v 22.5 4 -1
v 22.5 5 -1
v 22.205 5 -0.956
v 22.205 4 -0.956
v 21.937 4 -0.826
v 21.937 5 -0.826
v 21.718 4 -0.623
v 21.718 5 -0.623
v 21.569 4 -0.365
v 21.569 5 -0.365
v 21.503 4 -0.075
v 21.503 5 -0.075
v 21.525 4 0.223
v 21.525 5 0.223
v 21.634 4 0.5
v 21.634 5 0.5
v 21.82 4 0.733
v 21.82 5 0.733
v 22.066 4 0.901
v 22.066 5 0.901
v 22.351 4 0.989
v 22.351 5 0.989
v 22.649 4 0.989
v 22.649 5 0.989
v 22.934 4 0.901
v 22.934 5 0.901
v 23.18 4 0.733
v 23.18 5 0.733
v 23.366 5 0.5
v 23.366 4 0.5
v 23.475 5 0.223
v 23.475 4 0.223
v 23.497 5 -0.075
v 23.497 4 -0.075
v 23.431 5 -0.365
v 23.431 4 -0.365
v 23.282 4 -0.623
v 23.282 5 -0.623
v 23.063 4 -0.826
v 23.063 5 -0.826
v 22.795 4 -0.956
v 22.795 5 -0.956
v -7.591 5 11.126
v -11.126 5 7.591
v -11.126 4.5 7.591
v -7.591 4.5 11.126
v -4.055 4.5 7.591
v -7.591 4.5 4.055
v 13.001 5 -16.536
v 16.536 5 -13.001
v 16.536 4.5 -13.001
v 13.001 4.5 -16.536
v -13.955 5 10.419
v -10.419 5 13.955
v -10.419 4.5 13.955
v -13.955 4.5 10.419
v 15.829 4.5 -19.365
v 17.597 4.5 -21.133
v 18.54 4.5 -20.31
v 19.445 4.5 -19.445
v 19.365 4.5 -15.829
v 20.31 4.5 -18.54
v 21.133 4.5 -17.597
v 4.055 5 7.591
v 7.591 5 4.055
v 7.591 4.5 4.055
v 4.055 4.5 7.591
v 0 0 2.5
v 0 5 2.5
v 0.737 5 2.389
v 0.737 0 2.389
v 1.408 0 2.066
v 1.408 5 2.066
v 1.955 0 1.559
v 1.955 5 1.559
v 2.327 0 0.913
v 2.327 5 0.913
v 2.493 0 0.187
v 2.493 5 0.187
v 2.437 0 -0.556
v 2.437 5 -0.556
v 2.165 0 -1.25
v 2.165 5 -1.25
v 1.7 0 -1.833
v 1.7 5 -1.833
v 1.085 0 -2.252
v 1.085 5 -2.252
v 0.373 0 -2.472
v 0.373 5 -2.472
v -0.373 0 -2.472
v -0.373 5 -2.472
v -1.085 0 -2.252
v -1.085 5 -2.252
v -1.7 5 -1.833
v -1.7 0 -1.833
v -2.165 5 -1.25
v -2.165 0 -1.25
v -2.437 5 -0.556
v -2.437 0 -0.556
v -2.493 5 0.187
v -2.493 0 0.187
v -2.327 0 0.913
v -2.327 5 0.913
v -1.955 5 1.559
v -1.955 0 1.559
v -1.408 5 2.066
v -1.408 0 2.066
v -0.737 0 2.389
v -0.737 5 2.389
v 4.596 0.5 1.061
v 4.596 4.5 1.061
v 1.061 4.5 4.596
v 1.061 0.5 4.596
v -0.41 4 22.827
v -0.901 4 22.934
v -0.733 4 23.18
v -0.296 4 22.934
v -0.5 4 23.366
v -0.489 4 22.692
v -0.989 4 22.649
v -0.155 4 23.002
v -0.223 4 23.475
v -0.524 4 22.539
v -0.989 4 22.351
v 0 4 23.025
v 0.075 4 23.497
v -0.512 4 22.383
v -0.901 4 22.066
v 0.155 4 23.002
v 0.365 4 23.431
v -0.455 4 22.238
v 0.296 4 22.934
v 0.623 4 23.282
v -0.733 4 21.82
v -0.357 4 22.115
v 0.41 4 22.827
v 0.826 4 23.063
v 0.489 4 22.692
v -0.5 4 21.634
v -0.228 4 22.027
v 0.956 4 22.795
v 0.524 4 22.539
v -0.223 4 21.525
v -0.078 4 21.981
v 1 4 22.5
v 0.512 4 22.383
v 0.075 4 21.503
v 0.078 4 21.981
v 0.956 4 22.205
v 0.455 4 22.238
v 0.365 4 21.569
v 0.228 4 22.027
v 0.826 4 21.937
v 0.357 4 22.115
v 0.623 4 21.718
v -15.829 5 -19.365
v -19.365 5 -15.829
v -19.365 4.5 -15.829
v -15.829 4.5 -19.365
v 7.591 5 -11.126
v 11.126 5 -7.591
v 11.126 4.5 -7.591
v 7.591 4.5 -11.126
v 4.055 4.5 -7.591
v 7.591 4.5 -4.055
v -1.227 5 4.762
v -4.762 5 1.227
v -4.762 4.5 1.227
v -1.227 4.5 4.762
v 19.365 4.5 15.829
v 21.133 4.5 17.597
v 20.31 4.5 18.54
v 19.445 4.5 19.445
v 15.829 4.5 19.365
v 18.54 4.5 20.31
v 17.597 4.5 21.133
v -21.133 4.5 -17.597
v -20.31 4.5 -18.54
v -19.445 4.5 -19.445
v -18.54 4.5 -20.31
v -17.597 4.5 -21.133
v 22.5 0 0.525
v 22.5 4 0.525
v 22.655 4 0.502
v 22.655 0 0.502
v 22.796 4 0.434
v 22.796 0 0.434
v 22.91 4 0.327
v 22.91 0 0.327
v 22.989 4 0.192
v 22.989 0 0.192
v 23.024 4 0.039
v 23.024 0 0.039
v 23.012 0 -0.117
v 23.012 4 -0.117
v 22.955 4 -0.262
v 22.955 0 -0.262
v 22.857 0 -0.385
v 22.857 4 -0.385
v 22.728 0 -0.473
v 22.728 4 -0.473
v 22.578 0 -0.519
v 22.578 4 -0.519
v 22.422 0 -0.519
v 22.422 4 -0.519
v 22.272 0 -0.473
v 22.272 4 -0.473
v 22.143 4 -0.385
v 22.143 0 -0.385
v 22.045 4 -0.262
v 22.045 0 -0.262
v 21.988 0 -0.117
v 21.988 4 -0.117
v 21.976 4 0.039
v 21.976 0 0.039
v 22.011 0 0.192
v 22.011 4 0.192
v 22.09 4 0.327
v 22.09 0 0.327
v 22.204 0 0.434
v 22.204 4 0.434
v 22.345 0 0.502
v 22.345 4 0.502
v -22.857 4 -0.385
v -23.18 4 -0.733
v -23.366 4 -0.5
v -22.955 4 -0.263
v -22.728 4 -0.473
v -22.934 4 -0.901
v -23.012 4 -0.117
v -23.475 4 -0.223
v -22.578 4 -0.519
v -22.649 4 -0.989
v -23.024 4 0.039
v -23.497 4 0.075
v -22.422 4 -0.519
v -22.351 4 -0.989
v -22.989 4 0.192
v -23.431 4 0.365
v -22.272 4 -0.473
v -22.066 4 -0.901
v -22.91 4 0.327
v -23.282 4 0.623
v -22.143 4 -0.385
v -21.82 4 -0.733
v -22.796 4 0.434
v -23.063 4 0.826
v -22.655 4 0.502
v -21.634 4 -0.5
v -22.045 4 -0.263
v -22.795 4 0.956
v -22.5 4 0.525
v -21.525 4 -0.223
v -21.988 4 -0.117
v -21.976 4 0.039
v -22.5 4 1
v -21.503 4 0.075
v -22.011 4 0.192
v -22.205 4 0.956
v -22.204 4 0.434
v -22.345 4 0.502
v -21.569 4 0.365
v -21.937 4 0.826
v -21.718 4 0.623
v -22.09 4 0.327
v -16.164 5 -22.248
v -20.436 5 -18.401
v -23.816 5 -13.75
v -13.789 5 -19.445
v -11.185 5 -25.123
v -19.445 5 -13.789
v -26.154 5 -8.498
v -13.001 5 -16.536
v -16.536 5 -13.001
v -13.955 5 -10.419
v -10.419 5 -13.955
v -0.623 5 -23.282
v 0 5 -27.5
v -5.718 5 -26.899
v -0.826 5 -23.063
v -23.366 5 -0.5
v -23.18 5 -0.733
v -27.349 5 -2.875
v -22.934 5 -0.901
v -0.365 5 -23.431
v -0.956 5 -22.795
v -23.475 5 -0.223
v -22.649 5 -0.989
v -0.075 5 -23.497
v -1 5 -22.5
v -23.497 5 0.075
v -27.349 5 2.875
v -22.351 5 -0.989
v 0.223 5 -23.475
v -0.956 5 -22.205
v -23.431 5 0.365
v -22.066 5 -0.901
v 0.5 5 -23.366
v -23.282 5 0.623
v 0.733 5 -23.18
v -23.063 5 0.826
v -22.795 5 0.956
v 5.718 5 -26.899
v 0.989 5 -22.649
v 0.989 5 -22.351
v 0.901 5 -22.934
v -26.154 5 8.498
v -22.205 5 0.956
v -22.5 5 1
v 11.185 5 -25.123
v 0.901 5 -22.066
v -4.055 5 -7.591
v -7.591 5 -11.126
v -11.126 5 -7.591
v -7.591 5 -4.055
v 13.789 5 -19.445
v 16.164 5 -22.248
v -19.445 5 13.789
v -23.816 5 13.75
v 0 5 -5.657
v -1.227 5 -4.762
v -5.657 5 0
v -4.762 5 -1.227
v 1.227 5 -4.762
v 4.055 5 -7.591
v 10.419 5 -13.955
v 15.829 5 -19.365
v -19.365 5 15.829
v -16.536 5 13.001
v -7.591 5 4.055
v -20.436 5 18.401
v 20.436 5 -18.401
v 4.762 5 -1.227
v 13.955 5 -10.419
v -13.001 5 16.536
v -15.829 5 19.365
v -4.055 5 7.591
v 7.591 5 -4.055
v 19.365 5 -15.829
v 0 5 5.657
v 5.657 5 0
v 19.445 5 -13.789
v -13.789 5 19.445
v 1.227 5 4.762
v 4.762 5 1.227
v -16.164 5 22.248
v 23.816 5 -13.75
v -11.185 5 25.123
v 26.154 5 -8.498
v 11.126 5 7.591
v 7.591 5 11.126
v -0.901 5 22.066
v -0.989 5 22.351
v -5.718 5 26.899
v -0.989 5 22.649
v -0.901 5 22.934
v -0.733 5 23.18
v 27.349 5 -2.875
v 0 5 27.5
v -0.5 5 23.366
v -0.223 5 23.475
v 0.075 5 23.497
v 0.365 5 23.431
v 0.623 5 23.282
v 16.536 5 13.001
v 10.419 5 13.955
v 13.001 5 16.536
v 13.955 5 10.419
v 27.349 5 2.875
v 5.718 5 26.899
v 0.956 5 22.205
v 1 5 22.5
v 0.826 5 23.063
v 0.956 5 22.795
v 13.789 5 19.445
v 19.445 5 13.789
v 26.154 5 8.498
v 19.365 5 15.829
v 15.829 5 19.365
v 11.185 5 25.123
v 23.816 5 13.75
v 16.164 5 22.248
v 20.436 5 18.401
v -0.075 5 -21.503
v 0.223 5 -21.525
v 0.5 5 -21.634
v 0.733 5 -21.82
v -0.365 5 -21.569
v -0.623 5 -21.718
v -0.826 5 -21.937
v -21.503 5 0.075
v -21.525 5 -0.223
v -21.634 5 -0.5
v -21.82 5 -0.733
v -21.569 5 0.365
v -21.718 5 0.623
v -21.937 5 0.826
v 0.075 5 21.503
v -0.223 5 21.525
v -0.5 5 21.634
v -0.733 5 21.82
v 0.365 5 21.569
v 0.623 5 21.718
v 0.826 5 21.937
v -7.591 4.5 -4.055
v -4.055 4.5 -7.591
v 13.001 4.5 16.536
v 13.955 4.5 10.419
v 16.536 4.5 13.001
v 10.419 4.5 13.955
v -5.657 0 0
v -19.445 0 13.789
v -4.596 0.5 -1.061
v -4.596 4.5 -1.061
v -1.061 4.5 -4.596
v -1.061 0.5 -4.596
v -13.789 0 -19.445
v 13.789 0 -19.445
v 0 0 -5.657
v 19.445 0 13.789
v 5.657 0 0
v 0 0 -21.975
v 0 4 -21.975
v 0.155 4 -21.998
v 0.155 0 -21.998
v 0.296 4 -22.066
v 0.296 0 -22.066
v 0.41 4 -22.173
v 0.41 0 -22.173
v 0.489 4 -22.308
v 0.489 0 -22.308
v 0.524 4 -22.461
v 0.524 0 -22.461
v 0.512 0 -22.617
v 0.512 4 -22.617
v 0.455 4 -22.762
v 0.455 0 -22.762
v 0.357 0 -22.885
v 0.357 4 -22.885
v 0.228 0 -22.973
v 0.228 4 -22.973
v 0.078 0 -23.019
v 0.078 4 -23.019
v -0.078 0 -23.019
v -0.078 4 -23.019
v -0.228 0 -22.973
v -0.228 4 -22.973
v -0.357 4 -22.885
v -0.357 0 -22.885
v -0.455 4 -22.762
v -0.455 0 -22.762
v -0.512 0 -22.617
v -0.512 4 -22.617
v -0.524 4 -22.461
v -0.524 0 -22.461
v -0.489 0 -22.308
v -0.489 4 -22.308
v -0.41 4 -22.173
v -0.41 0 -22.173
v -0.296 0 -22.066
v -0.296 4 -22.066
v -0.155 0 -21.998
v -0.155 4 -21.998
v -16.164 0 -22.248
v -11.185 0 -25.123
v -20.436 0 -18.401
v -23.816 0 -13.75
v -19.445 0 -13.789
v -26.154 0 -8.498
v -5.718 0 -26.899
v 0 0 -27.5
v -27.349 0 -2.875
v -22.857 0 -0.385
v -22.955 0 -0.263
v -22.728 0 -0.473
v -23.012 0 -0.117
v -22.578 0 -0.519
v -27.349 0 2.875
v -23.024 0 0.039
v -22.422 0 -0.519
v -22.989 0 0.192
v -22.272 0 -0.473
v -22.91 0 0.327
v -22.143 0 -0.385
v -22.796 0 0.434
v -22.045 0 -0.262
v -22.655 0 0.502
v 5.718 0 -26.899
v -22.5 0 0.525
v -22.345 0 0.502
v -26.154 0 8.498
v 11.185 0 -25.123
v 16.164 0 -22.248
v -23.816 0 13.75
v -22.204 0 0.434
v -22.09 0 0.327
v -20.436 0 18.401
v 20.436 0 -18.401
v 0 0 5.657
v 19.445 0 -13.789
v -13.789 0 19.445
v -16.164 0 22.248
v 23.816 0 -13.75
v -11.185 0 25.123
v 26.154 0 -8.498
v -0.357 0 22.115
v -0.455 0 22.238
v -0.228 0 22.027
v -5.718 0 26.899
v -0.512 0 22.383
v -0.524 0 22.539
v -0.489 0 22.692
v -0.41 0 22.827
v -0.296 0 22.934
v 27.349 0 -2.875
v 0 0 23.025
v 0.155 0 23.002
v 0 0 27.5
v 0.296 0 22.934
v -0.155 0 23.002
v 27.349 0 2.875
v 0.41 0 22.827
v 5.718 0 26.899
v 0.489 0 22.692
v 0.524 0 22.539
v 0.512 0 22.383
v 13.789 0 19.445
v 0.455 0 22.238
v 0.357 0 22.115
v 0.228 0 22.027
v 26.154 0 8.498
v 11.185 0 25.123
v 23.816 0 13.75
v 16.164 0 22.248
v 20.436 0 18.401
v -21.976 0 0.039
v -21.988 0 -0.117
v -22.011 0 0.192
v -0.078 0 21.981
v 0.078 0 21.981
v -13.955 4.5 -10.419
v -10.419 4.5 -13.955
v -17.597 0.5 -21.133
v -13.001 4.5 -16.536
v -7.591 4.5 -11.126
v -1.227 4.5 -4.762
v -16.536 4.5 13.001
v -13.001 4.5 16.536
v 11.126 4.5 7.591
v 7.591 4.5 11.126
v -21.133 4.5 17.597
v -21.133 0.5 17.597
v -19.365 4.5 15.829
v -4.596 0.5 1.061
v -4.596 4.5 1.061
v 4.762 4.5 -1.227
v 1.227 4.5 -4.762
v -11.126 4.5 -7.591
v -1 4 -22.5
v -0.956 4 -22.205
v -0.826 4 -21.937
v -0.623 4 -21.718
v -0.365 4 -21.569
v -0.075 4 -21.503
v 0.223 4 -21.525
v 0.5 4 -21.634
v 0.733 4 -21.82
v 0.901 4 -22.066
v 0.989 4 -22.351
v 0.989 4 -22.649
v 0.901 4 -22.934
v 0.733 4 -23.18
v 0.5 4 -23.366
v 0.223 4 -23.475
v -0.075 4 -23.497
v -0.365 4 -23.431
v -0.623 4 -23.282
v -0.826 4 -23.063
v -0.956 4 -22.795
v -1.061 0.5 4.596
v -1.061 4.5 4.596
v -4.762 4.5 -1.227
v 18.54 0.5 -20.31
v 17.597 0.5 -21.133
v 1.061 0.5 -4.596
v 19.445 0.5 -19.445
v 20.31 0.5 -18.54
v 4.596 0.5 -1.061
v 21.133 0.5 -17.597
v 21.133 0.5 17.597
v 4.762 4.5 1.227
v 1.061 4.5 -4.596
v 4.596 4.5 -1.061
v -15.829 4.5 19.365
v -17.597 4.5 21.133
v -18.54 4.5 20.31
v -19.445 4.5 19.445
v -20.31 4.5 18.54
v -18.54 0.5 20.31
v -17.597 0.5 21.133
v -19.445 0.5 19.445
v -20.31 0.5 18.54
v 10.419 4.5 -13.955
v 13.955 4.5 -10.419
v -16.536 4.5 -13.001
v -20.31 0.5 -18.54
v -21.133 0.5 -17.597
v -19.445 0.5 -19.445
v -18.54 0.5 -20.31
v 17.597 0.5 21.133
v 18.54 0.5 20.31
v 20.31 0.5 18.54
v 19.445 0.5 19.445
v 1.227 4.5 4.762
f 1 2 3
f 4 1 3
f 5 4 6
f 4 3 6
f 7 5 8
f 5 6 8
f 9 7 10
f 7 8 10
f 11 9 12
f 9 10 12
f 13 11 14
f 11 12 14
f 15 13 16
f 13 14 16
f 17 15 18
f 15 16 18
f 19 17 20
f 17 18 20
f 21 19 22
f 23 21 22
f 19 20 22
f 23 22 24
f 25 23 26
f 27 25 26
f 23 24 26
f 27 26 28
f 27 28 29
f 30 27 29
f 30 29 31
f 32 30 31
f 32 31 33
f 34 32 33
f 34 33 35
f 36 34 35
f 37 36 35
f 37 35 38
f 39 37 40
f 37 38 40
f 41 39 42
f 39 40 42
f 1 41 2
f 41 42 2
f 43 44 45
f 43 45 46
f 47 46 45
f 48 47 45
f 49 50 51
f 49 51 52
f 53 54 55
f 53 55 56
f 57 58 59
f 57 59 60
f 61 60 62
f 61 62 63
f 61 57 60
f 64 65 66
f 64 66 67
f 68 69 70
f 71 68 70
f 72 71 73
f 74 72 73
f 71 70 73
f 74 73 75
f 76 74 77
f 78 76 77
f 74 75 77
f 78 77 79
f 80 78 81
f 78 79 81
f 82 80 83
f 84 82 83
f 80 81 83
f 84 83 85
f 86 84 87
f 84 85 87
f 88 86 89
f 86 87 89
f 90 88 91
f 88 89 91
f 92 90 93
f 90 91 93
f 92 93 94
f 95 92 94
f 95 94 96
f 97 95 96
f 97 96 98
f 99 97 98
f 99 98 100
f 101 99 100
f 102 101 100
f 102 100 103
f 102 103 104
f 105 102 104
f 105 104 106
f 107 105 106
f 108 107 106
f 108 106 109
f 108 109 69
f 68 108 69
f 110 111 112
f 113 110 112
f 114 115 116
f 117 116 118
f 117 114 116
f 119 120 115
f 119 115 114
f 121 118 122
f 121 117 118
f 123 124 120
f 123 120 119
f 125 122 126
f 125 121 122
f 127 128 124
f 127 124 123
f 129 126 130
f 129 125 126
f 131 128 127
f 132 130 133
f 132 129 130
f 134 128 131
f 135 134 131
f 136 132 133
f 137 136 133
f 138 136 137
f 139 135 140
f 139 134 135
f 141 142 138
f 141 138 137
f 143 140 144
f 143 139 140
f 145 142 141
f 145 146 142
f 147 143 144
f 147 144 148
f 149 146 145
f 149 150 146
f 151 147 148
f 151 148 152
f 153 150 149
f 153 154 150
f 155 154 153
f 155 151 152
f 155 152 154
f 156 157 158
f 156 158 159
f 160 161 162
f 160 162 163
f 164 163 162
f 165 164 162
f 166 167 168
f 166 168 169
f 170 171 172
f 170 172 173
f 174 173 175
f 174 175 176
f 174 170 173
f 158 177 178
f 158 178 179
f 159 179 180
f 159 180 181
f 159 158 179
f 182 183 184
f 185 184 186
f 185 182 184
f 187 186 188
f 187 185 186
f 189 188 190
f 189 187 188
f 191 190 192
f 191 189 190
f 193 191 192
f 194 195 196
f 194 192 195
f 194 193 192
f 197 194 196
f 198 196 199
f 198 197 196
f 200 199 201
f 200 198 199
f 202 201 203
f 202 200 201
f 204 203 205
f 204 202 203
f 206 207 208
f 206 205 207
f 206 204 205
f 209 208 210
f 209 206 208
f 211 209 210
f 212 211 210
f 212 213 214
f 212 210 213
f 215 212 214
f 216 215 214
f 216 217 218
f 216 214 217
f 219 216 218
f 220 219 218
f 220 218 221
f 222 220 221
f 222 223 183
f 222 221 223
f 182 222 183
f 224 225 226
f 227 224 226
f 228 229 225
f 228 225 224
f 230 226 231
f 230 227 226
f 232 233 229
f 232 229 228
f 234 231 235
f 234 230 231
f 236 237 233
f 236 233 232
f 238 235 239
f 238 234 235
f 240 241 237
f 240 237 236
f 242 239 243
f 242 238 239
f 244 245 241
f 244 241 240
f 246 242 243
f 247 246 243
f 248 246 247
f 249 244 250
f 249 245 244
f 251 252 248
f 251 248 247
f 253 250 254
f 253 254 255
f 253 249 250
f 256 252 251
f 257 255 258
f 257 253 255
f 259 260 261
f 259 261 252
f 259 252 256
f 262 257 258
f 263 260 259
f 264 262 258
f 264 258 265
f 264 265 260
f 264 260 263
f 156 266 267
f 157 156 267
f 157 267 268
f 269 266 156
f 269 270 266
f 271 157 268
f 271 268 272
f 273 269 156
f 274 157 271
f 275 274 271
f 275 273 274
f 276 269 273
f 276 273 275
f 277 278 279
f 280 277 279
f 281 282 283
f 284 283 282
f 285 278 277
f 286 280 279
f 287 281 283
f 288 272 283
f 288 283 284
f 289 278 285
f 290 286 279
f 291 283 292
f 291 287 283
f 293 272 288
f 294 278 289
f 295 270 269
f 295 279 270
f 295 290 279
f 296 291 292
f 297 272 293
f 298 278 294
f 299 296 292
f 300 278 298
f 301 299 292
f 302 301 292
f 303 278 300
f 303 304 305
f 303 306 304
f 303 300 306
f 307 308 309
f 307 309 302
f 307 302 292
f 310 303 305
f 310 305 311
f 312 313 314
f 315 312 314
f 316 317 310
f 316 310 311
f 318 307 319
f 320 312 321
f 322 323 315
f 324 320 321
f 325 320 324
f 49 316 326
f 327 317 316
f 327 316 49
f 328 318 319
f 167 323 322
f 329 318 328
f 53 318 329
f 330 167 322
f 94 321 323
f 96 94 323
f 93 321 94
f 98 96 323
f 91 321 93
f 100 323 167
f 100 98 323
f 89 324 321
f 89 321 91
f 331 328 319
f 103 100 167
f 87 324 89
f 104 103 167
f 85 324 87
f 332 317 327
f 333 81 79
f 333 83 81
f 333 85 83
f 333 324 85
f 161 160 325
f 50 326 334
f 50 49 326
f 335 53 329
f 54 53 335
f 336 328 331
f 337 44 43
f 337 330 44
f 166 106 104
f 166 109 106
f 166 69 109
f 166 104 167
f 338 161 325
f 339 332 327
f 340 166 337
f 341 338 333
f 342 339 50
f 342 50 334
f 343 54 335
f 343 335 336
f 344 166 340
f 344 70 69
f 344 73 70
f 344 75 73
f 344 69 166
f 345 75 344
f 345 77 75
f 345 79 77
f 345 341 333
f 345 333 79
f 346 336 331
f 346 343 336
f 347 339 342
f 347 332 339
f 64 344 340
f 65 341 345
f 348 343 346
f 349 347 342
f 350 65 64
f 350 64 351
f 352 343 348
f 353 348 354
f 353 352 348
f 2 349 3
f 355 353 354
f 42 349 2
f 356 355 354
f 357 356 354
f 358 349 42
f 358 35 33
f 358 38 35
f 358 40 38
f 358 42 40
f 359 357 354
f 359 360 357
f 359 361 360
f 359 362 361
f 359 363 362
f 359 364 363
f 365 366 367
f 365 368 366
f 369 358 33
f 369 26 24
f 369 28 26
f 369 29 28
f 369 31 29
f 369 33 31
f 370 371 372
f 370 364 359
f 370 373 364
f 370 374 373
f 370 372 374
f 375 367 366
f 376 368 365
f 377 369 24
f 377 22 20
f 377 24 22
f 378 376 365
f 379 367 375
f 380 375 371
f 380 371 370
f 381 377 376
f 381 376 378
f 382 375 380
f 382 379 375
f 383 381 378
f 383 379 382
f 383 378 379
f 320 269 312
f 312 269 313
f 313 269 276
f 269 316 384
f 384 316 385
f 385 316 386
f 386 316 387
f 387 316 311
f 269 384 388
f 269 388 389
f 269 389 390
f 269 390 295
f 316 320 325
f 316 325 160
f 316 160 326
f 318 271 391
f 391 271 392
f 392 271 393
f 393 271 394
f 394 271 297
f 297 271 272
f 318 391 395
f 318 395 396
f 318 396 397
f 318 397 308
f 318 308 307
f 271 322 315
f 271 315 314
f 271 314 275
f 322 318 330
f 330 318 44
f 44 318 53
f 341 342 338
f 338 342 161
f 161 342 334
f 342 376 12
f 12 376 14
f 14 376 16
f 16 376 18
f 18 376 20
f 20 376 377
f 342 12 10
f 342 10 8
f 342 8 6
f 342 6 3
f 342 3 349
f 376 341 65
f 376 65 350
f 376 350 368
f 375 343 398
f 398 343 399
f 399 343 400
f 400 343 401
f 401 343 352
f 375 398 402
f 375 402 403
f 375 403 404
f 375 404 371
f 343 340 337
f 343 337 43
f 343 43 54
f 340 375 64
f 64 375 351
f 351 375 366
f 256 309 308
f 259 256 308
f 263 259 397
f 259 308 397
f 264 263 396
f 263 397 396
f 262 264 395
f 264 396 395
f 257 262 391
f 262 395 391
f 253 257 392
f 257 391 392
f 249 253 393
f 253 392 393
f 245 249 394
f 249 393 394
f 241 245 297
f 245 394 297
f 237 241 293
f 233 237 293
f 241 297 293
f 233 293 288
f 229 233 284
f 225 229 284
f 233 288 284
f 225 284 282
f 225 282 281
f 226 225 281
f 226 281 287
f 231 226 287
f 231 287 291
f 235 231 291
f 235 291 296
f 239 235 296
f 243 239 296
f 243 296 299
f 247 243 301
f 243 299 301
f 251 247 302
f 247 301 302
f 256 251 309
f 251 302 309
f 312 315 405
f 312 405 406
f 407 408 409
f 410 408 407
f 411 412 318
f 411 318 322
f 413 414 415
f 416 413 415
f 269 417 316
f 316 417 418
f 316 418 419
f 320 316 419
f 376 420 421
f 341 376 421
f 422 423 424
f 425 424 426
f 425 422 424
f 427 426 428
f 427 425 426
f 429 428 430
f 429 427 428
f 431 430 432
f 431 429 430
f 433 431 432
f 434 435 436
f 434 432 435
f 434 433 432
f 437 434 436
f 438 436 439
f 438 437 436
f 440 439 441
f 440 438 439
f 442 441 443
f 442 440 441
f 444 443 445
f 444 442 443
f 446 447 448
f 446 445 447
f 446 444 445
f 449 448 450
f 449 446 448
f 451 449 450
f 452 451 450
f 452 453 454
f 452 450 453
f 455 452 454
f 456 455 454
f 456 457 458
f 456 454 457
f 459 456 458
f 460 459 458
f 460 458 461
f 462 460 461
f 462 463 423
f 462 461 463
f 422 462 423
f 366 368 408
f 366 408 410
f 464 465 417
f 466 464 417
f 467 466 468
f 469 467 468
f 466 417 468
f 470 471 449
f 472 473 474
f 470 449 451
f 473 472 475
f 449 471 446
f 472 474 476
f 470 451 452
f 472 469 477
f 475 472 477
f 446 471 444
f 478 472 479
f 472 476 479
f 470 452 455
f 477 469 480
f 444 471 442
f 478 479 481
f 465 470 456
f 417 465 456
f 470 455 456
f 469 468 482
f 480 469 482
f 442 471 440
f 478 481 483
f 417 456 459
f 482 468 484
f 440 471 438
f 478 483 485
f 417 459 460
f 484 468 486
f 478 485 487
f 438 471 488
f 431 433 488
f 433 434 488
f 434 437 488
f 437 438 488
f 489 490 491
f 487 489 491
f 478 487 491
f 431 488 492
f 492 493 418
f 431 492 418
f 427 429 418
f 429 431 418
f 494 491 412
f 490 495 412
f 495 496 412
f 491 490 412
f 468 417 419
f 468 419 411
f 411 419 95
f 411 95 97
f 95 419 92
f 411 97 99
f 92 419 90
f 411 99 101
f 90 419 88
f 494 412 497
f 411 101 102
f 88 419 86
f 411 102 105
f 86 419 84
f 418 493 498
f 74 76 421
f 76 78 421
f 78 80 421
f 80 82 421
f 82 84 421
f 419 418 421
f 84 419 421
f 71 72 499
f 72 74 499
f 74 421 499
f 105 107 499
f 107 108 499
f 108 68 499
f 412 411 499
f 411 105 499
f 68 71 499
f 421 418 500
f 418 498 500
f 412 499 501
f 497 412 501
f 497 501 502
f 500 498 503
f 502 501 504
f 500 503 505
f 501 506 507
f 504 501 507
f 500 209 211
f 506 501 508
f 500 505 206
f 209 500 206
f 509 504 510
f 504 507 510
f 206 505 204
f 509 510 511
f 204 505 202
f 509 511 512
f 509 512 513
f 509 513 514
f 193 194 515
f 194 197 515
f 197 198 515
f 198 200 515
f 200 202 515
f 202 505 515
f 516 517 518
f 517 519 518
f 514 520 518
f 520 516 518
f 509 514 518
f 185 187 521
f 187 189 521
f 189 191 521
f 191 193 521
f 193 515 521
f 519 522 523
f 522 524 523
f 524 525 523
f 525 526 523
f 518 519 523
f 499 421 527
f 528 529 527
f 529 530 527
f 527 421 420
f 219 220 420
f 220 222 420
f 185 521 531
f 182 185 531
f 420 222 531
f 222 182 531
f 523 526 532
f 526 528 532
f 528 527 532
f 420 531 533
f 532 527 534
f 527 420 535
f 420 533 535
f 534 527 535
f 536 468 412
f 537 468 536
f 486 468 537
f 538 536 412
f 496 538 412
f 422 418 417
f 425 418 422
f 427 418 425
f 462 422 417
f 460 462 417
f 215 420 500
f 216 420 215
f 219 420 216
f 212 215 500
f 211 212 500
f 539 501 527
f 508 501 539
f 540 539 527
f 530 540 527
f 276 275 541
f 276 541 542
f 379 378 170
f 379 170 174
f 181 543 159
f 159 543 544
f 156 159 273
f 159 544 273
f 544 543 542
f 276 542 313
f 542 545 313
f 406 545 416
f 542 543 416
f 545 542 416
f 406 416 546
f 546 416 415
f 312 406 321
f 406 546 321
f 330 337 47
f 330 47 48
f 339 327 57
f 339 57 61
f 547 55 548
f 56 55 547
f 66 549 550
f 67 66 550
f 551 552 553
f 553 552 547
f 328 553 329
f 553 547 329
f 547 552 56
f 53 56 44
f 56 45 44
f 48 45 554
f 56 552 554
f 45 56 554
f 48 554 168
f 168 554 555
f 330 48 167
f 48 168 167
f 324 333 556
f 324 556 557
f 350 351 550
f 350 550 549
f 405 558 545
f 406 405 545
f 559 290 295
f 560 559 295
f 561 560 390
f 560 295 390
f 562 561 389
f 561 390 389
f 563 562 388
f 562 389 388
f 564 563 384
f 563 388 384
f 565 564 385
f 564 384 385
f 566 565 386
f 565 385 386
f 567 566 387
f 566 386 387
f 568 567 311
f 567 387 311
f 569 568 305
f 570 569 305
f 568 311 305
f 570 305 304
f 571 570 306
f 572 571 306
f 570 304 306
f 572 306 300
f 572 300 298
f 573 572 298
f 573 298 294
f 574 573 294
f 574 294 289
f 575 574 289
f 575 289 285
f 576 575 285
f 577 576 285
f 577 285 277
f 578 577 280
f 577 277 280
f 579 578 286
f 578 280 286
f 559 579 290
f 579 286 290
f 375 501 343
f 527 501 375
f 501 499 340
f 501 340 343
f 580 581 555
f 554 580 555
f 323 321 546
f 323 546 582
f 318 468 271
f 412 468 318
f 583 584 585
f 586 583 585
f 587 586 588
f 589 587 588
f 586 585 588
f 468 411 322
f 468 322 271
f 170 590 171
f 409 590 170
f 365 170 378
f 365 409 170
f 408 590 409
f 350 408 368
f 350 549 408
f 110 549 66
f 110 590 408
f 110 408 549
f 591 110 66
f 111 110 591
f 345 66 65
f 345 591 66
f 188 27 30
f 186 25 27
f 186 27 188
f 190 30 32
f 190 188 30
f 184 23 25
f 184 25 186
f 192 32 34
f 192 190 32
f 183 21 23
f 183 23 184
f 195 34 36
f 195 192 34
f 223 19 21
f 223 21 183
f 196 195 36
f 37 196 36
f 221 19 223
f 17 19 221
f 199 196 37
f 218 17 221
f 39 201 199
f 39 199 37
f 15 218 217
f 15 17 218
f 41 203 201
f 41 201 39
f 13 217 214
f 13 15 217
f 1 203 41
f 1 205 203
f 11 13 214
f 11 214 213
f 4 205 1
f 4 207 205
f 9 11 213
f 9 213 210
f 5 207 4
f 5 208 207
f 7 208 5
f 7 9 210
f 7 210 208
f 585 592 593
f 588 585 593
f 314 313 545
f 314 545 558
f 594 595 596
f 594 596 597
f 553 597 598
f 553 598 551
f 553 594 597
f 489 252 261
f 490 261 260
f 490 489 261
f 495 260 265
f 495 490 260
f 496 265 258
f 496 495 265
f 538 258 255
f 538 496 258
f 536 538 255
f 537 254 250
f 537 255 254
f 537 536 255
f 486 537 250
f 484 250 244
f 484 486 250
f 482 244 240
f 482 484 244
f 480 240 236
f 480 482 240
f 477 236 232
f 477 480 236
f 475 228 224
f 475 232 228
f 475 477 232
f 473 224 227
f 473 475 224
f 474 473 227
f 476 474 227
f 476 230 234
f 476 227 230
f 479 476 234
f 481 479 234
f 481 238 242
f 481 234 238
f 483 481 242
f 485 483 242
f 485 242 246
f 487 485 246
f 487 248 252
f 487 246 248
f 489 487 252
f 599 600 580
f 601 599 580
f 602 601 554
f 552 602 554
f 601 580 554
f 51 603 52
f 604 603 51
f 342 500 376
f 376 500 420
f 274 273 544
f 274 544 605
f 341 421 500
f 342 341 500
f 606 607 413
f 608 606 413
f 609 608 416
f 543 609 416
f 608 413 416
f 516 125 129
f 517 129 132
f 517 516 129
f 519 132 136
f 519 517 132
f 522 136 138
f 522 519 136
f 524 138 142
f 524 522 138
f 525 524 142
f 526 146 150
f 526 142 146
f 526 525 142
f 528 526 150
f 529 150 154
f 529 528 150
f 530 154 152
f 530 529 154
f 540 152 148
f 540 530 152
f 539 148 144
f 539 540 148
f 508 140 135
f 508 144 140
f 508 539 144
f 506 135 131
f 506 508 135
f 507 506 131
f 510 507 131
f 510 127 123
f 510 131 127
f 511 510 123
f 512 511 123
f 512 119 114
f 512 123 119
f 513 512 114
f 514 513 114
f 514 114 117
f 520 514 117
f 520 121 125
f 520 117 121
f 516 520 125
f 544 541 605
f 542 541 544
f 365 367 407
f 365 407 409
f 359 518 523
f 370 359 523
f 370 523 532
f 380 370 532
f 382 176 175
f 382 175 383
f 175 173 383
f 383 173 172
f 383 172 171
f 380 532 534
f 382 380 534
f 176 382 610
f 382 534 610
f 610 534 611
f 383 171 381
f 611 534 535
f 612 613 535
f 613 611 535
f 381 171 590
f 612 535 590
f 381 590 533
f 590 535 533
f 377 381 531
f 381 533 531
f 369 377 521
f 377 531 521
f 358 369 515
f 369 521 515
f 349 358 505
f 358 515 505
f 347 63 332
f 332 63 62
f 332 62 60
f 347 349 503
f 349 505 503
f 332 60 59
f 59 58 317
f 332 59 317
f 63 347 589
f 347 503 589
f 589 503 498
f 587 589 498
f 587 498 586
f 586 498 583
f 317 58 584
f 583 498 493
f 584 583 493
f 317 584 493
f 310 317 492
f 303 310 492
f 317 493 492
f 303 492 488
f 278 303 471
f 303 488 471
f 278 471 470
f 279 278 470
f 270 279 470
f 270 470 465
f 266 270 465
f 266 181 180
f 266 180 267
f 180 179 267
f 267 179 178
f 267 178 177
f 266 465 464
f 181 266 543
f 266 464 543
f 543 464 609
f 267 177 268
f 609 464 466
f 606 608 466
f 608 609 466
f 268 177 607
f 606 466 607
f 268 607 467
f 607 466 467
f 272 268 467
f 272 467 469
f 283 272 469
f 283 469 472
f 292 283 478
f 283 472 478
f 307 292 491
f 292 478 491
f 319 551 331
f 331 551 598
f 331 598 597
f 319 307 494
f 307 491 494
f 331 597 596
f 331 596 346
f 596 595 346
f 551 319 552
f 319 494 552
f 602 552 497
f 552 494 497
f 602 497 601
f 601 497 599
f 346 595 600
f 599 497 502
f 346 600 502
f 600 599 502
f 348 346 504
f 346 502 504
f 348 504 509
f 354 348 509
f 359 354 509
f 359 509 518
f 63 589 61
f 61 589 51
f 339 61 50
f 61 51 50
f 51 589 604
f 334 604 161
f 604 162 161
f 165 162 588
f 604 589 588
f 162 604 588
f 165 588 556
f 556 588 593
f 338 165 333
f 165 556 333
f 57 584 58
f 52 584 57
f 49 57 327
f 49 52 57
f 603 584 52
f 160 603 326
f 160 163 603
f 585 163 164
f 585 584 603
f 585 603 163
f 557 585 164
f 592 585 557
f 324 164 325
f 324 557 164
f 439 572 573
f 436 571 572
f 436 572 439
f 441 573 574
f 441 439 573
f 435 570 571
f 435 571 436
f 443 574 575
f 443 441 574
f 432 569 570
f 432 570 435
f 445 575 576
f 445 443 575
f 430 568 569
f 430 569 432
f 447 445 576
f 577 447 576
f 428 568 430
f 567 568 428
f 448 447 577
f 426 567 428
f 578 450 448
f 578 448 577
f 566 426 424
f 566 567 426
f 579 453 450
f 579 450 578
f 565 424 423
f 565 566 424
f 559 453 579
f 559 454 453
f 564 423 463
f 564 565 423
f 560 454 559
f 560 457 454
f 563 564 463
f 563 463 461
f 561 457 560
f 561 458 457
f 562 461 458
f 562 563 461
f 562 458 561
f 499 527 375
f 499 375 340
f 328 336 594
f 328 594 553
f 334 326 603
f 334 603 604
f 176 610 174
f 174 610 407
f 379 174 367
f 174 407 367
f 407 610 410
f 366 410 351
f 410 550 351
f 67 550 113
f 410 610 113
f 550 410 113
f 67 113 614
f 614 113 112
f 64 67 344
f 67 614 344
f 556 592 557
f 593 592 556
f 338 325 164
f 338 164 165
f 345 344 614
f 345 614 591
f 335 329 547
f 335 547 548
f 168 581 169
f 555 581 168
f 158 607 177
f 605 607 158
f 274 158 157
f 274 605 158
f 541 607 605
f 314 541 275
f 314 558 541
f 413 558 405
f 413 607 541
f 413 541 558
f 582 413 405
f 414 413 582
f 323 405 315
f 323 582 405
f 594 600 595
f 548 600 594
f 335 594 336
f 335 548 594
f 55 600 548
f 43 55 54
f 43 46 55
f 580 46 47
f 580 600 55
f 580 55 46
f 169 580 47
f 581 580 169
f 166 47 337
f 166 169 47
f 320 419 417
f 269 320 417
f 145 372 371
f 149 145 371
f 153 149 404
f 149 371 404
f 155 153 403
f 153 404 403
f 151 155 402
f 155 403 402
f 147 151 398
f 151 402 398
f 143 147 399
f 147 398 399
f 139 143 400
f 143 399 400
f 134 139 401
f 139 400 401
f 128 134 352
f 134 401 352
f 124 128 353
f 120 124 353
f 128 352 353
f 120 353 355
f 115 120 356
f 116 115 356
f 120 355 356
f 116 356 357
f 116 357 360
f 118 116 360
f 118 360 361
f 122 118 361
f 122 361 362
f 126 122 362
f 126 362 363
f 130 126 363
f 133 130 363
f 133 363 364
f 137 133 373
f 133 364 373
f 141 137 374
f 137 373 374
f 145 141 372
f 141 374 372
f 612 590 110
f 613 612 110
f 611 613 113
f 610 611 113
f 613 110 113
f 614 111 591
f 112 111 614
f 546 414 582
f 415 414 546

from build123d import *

# Parameters (mm, degrees)
SKETCH_2_R               = 27.5
SKETCH_2_R_2             = 0.525
EXTRUDE_1_DEPTH          = 5
SKETCH_5_W               = 5
SKETCH_5_H               = 4
CUT_EXTRUDE_1_DEPTH      = 44.181327292
PATTERN_CIRCULAR_1_COUNT = 4
CUT_EXTRUDE_2_DEPTH      = 2
PATTERN_CIRCULAR_2_COUNT = 4
SKETCH_7_R               = 2.5
CUT_EXTRUDE_3_DEPTH      = 40.210967853
SKETCH_8_R               = 1
CUT_EXTRUDE_4_DEPTH      = 1
PATTERN_CIRCULAR_3_COUNT = 4


with BuildPart() as part:
    # 草图2 → 凸台-拉伸1 (new body)
    with BuildSketch(Plane(origin=(0, 0, 0), x_dir=(1, 0, 0), z_dir=(0, 1, 0))):
        Circle(SKETCH_2_R)
        with Locations((0, 22.5)):
            Circle(SKETCH_2_R_2, mode=Mode.SUBTRACT)
        with Locations((22.5, -2e-09)):
            Circle(SKETCH_2_R_2, mode=Mode.SUBTRACT)
        with Locations((-2e-09, -22.500000002)):
            Circle(SKETCH_2_R_2, mode=Mode.SUBTRACT)
        with Locations((-22.500000002, 0)):
            Circle(SKETCH_2_R_2, mode=Mode.SUBTRACT)
        Polygon((-13.788582233, 19.445436483), (13.788582233, 19.445436483), (0, 5.656854249), align=None, mode=Mode.SUBTRACT)
        Polygon((-19.445436483, 13.788582233), (-19.445436483, -13.788582233), (-5.656854249, 0), align=None, mode=Mode.SUBTRACT)
        Polygon((-13.788582233, -19.445436483), (13.788582233, -19.445436483), (0, -5.656854249), align=None, mode=Mode.SUBTRACT)
        Polygon((19.445436483, 13.788582233), (19.445436483, -13.788582233), (5.656854249, 0), align=None, mode=Mode.SUBTRACT)
    extrude(amount=EXTRUDE_1_DEPTH)

    # 草图5 → 切除-拉伸1 (cut, through all)
    with BuildSketch(Plane(origin=(2.828427515, 4.42e-07, -2.828427515), x_dir=(0.7071067811865507, 0, 0.7071067811865444), z_dir=(-0.7071067811865401, -1.1050996923684133e-07, 0.7071067811865465))):
        with Locations((0, 2.5)):
            Rectangle(SKETCH_5_W, SKETCH_5_H)
    cut_extrude_1 = extrude(amount=-CUT_EXTRUDE_1_DEPTH, mode=Mode.SUBTRACT)

    # 阵列(圆周)1: 切除-拉伸1 ×4 about axis
    pattern_circular_1_axis = Axis((0, 5, 0), (0, -1, 0))
    for i in range(1, PATTERN_CIRCULAR_1_COUNT):
        add(cut_extrude_1.rotate(pattern_circular_1_axis, i * 360 / PATTERN_CIRCULAR_1_COUNT), mode=Mode.SUBTRACT)

    # 草图6 → 切除-拉伸2 (cut)
    with BuildSketch(Plane(origin=(0, 5, 0), x_dir=(1, 0, 0), z_dir=(0, 1, 0))):
        Polygon((-4.762221068, 1.226687162), (-1.226687162, 4.762221068), (-4.055114287, 7.590648193), (-7.590648193, 4.055114287), align=None)
        Polygon((-19.364916731, 15.829382825), (-16.536489606, 13.0009557), (-13.0009557, 16.536489606), (-15.829382825, 19.364916731), align=None)
        Polygon((-13.954609224, 10.419075318), (-11.126182099, 7.590648193), (-7.590648193, 11.126182099), (-10.419075318, 13.954609224), align=None)
    cut_extrude_2 = extrude(amount=-CUT_EXTRUDE_2_DEPTH, mode=Mode.SUBTRACT)

    # 阵列(圆周)2: 切除-拉伸2 ×4 about axis
    pattern_circular_2_axis = Axis((0, 5, 0), (0, -1, 0))
    for i in range(1, PATTERN_CIRCULAR_2_COUNT):
        add(cut_extrude_2.rotate(pattern_circular_2_axis, i * 360 / PATTERN_CIRCULAR_2_COUNT), mode=Mode.SUBTRACT)

    # 草图7 → 切除-拉伸3 (cut, through all)
    with BuildSketch(Plane(origin=(0, 5, 0), x_dir=(1, 0, 0), z_dir=(0, 1, 0))):
        Circle(SKETCH_7_R)
    extrude(amount=-CUT_EXTRUDE_3_DEPTH, mode=Mode.SUBTRACT)

    # 草图8 → 切除-拉伸4 (cut)
    with BuildSketch(Plane(origin=(0, 5, 0), x_dir=(1, 0, 0), z_dir=(0, 1, 0))):
        with Locations((-22.500000002, 0)):
            Circle(SKETCH_8_R)
    cut_extrude_4 = extrude(amount=-CUT_EXTRUDE_4_DEPTH, mode=Mode.SUBTRACT)

    # 阵列(圆周)3: 切除-拉伸4 ×4 about axis
    pattern_circular_3_axis = Axis((0, 5, 0), (0, -1, 0))
    for i in range(1, PATTERN_CIRCULAR_3_COUNT):
        add(cut_extrude_4.rotate(pattern_circular_3_axis, i * 360 / PATTERN_CIRCULAR_3_COUNT), mode=Mode.SUBTRACT)


solid = part.part
